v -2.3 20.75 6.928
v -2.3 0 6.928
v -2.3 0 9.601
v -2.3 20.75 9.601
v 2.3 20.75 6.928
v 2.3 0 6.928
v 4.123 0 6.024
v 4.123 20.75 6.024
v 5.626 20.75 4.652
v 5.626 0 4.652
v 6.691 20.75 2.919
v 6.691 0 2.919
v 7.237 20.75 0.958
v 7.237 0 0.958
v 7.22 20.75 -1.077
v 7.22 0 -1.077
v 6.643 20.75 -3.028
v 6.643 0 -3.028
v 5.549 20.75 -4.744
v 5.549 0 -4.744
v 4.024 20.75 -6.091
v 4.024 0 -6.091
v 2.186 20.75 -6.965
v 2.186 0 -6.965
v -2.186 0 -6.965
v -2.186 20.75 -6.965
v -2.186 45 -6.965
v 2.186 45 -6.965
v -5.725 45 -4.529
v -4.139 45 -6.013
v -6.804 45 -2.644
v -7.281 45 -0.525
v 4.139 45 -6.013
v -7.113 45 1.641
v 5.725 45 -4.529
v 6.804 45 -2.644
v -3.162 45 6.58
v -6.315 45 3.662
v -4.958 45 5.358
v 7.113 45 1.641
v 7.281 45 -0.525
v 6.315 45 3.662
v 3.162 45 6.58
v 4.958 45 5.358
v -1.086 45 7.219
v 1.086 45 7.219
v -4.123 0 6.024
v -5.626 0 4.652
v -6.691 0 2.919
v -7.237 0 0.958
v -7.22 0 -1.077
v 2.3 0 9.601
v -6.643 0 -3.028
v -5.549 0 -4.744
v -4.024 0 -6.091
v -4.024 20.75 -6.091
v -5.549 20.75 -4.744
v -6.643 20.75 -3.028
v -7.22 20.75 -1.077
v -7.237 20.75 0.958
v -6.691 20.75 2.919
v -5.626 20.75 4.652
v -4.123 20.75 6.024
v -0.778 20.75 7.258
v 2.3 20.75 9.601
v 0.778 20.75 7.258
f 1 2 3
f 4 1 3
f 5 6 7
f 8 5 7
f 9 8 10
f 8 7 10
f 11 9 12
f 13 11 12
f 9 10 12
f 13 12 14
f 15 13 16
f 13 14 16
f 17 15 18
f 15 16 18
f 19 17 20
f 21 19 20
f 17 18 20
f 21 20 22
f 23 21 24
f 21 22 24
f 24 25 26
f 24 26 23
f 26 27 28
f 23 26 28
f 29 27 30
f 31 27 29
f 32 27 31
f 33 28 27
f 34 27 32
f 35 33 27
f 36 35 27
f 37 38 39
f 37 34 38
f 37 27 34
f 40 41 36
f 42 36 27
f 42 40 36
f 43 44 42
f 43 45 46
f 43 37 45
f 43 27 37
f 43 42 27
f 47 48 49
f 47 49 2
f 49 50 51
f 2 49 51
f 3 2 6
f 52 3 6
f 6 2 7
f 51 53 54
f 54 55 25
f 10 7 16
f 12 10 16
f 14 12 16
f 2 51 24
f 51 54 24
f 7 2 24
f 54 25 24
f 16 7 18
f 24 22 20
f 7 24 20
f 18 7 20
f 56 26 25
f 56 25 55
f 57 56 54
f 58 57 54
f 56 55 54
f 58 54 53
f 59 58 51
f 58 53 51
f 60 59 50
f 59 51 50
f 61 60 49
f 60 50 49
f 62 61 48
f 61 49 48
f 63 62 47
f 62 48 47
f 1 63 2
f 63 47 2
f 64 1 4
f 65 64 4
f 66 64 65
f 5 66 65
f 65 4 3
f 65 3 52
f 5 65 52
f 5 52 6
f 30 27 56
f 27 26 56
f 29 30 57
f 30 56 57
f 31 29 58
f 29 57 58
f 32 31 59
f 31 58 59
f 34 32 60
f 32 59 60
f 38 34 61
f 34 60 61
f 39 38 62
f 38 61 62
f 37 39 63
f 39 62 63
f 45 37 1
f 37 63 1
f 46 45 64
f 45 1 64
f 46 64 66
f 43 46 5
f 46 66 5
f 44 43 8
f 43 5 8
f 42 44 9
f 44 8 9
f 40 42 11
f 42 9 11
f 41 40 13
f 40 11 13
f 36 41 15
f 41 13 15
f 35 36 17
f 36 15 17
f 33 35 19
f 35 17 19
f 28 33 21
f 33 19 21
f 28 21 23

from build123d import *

# Parameters (mm, degrees)
BOSS_EXTRUDE1_DEPTH = 20.75
SKETCH2_R           = 7.3
BOSS_EXTRUDE2_DEPTH = 24.25
CUT_EXTRUDE1_DEPTH  = 50


with BuildPart() as part:
    # Sketch1 → Boss-Extrude1 (new body)
    with BuildSketch(Plane(origin=(0, 0, 0), x_dir=(1, 0, 0), z_dir=(0, 1, 0))):
        with BuildLine():
            Line((-2.3, -6.92820323), (-2.3, -9.601067812))
            Line((-2.3, -9.601067812), (2.3, -9.601067812))
            Line((2.3, -9.601067812), (2.3, -6.92820323))
            ThreePointArc((2.3, -6.92820323), (0, 7.3), (-2.3, -6.92820323))
        make_face()
    extrude(amount=BOSS_EXTRUDE1_DEPTH)

    # Sketch2 → Boss-Extrude2 (add)
    with BuildSketch(Plane(origin=(0, 20.75, 0), x_dir=(1, 0, 0), z_dir=(0, 1, 0))):
        with Locations(Location((0, 0, 0), (0, 0, 251.635051289))):
            Circle(SKETCH2_R)
    extrude(amount=BOSS_EXTRUDE2_DEPTH)

    # Sketch3 → Cut-Extrude1 (cut)
    with BuildSketch(Plane(origin=(0, 45, 0), x_dir=(1, 0, 0), z_dir=(0, 1, 0))):
        with BuildLine():
            Line((-2.5, 6.96491206), (2.5, 6.96491206))
            ThreePointArc((2.5, 6.96491206), (0, 7.4), (-2.5, 6.96491206))
        make_face()
    extrude(amount=-CUT_EXTRUDE1_DEPTH, mode=Mode.SUBTRACT)


solid = part.part
